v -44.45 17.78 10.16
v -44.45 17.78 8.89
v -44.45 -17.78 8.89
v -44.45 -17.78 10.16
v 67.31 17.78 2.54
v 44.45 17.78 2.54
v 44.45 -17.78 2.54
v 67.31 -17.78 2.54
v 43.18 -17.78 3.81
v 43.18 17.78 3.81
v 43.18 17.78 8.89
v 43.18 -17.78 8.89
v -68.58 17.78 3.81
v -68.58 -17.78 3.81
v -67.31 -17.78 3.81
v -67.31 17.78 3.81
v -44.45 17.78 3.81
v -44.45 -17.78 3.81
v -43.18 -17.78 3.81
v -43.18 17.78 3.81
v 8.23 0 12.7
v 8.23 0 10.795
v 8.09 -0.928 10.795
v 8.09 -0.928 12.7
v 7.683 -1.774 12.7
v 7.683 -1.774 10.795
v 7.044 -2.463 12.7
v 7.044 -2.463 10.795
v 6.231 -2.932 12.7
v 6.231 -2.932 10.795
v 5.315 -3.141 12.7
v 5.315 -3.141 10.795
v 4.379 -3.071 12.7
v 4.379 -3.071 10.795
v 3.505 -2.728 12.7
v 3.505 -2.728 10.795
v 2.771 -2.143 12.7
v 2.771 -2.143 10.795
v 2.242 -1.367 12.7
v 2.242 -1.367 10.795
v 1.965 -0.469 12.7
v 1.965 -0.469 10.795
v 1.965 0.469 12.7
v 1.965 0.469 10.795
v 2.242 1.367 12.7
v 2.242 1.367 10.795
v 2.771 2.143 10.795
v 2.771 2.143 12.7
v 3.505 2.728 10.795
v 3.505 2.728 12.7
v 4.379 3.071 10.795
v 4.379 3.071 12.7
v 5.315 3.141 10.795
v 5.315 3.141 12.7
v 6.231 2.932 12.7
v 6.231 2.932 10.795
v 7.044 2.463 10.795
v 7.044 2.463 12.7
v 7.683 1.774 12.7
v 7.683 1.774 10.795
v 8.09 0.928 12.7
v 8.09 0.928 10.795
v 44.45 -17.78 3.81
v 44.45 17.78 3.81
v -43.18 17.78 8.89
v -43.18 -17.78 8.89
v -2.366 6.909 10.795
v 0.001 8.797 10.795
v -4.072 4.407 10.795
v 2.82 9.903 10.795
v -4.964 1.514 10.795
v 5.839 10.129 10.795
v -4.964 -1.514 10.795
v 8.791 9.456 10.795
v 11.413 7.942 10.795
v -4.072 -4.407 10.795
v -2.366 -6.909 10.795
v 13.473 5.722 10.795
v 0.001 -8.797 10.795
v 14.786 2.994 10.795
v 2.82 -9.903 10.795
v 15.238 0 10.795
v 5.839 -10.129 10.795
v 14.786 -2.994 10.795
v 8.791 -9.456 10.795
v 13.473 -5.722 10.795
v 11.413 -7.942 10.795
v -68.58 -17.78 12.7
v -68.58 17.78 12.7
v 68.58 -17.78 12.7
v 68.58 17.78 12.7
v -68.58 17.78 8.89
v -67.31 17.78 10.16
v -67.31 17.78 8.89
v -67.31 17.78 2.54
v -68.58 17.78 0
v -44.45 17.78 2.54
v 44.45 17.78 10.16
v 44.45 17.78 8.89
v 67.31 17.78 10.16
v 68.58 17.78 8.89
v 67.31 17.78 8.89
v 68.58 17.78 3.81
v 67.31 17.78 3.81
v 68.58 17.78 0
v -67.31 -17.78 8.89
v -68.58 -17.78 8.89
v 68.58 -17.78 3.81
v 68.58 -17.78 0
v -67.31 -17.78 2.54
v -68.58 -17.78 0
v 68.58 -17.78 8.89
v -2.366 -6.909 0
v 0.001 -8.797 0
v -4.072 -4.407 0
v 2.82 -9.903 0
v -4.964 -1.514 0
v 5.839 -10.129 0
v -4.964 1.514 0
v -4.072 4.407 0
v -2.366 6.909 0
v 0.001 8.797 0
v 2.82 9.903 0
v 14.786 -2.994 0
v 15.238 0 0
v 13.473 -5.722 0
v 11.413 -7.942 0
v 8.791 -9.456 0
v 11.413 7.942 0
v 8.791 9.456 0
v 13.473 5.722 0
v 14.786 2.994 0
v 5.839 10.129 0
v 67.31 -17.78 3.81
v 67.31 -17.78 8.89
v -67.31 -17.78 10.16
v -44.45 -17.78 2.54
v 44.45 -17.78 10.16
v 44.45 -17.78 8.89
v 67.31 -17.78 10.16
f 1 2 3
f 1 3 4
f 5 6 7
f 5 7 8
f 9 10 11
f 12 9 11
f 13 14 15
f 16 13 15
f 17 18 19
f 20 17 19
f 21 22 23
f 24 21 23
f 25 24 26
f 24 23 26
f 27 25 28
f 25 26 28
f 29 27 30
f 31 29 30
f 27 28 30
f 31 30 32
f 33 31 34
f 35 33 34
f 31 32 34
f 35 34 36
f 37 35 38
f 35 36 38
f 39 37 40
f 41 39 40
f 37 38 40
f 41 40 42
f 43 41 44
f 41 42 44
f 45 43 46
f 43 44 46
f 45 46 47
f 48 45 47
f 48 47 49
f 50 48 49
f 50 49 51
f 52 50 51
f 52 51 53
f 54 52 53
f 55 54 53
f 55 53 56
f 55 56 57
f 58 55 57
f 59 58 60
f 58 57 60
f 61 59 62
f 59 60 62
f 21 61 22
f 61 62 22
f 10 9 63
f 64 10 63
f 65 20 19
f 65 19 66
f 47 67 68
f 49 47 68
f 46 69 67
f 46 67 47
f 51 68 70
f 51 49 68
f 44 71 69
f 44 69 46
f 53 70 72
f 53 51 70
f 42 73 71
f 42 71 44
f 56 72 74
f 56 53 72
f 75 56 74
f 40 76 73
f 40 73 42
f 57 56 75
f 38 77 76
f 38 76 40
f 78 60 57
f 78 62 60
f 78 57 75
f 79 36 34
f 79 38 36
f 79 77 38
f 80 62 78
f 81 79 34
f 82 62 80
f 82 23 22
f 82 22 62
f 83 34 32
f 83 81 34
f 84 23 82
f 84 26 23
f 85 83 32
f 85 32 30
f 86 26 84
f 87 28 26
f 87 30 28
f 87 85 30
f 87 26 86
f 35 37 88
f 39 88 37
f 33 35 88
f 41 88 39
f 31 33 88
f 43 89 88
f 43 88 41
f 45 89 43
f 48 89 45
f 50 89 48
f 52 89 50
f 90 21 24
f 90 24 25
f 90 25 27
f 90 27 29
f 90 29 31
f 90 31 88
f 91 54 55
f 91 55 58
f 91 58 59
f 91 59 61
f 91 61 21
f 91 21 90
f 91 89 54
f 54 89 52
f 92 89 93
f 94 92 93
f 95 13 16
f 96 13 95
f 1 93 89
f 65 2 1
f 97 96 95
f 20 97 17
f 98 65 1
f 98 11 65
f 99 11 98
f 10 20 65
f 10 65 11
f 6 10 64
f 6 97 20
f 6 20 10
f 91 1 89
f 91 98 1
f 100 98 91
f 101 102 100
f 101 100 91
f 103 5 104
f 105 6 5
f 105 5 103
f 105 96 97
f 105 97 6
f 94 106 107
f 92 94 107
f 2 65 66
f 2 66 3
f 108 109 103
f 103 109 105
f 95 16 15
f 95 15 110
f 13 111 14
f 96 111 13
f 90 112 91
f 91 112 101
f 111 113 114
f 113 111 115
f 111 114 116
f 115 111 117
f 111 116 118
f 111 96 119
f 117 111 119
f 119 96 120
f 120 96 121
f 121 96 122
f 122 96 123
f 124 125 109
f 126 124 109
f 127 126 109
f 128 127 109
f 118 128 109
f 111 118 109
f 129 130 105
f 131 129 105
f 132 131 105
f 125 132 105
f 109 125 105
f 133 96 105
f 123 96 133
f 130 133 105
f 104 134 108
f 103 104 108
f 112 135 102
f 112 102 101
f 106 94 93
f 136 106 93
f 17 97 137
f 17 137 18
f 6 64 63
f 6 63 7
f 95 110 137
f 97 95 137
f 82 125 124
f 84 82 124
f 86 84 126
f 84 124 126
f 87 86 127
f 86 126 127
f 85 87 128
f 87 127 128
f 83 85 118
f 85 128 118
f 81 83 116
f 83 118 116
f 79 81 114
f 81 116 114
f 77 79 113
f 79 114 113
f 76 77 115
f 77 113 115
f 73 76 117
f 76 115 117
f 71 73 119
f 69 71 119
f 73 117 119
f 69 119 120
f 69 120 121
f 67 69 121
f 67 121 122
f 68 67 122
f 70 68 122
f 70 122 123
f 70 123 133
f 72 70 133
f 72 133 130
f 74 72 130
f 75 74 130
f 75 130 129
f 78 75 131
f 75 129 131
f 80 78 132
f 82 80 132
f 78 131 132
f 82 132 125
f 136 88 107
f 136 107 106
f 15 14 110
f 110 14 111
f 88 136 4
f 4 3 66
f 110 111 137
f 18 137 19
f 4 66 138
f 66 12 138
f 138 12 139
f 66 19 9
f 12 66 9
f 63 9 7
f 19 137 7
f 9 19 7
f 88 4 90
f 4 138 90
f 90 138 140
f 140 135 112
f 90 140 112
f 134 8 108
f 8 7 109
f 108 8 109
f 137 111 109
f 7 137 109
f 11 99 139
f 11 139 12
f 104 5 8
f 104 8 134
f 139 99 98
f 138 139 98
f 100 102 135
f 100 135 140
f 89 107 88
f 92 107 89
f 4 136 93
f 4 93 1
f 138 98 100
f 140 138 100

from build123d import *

# Parameters (mm, degrees)
F0_W     = 137.16
F0_H     = 35.56
F1_DEPTH = 12.7
F2_R     = 10.1577407599
F3_DEPTH = 10.795
F4_R     = 3.15
F5_DEPTH = 1.905
F6_W     = 22.86
F6_H     = 1.27
F6_H_2   = 5.08
F6_W_2   = 1.27
F7_DEPTH = 50.8


with BuildPart() as f1:
    # F0 (on Top) → F1 (new body)
    with BuildSketch(Plane.XY):
        Rectangle(F0_W, F0_H)
    extrude(amount=F1_DEPTH)

    # F2 (on face) → F3 (cut)
    with BuildSketch(Plane(origin=(0, 0, 0), x_dir=(1, 0, 0), z_dir=(0, 0, -1))):
        with Locations((5.08, 0)):
            Circle(F2_R)
    extrude(amount=-F3_DEPTH, mode=Mode.SUBTRACT)

    # F4 (on face) → F5 (cut)
    with BuildSketch(Plane(origin=(0, 0, 10.795), x_dir=(1, 0, 0), z_dir=(0, 0, -1))):
        with Locations((5.08, 0)):
            Circle(F4_R)
    extrude(amount=-F5_DEPTH, mode=Mode.SUBTRACT)

    # F6 (on face) → F7 (cut)
    with BuildSketch(Plane.XZ.offset(17.78)):
        with Locations((55.88, 3.175)):
            Rectangle(F6_W, F6_H)
        with Locations((55.88, 6.35)):
            Rectangle(F6_W, F6_H_2)
        with Locations((43.815, 6.35)):
            Rectangle(F6_W_2, F6_H_2)
        with Locations((55.88, 9.525)):
            Rectangle(F6_W, F6_H)
        with Locations((67.945, 6.35)):
            Rectangle(F6_W_2, F6_H_2)
        with Locations((-55.88, 3.175)):
            Rectangle(F6_W, F6_H)
        with Locations((-55.88, 6.35)):
            Rectangle(F6_W, F6_H_2)
        with Locations((-67.945, 6.35)):
            Rectangle(F6_W_2, F6_H_2)
        with Locations((-43.815, 6.35)):
            Rectangle(F6_W_2, F6_H_2)
        with Locations((-55.88, 9.525)):
            Rectangle(F6_W, F6_H)
    extrude(amount=-F7_DEPTH, mode=Mode.SUBTRACT)


solid = f1.part
